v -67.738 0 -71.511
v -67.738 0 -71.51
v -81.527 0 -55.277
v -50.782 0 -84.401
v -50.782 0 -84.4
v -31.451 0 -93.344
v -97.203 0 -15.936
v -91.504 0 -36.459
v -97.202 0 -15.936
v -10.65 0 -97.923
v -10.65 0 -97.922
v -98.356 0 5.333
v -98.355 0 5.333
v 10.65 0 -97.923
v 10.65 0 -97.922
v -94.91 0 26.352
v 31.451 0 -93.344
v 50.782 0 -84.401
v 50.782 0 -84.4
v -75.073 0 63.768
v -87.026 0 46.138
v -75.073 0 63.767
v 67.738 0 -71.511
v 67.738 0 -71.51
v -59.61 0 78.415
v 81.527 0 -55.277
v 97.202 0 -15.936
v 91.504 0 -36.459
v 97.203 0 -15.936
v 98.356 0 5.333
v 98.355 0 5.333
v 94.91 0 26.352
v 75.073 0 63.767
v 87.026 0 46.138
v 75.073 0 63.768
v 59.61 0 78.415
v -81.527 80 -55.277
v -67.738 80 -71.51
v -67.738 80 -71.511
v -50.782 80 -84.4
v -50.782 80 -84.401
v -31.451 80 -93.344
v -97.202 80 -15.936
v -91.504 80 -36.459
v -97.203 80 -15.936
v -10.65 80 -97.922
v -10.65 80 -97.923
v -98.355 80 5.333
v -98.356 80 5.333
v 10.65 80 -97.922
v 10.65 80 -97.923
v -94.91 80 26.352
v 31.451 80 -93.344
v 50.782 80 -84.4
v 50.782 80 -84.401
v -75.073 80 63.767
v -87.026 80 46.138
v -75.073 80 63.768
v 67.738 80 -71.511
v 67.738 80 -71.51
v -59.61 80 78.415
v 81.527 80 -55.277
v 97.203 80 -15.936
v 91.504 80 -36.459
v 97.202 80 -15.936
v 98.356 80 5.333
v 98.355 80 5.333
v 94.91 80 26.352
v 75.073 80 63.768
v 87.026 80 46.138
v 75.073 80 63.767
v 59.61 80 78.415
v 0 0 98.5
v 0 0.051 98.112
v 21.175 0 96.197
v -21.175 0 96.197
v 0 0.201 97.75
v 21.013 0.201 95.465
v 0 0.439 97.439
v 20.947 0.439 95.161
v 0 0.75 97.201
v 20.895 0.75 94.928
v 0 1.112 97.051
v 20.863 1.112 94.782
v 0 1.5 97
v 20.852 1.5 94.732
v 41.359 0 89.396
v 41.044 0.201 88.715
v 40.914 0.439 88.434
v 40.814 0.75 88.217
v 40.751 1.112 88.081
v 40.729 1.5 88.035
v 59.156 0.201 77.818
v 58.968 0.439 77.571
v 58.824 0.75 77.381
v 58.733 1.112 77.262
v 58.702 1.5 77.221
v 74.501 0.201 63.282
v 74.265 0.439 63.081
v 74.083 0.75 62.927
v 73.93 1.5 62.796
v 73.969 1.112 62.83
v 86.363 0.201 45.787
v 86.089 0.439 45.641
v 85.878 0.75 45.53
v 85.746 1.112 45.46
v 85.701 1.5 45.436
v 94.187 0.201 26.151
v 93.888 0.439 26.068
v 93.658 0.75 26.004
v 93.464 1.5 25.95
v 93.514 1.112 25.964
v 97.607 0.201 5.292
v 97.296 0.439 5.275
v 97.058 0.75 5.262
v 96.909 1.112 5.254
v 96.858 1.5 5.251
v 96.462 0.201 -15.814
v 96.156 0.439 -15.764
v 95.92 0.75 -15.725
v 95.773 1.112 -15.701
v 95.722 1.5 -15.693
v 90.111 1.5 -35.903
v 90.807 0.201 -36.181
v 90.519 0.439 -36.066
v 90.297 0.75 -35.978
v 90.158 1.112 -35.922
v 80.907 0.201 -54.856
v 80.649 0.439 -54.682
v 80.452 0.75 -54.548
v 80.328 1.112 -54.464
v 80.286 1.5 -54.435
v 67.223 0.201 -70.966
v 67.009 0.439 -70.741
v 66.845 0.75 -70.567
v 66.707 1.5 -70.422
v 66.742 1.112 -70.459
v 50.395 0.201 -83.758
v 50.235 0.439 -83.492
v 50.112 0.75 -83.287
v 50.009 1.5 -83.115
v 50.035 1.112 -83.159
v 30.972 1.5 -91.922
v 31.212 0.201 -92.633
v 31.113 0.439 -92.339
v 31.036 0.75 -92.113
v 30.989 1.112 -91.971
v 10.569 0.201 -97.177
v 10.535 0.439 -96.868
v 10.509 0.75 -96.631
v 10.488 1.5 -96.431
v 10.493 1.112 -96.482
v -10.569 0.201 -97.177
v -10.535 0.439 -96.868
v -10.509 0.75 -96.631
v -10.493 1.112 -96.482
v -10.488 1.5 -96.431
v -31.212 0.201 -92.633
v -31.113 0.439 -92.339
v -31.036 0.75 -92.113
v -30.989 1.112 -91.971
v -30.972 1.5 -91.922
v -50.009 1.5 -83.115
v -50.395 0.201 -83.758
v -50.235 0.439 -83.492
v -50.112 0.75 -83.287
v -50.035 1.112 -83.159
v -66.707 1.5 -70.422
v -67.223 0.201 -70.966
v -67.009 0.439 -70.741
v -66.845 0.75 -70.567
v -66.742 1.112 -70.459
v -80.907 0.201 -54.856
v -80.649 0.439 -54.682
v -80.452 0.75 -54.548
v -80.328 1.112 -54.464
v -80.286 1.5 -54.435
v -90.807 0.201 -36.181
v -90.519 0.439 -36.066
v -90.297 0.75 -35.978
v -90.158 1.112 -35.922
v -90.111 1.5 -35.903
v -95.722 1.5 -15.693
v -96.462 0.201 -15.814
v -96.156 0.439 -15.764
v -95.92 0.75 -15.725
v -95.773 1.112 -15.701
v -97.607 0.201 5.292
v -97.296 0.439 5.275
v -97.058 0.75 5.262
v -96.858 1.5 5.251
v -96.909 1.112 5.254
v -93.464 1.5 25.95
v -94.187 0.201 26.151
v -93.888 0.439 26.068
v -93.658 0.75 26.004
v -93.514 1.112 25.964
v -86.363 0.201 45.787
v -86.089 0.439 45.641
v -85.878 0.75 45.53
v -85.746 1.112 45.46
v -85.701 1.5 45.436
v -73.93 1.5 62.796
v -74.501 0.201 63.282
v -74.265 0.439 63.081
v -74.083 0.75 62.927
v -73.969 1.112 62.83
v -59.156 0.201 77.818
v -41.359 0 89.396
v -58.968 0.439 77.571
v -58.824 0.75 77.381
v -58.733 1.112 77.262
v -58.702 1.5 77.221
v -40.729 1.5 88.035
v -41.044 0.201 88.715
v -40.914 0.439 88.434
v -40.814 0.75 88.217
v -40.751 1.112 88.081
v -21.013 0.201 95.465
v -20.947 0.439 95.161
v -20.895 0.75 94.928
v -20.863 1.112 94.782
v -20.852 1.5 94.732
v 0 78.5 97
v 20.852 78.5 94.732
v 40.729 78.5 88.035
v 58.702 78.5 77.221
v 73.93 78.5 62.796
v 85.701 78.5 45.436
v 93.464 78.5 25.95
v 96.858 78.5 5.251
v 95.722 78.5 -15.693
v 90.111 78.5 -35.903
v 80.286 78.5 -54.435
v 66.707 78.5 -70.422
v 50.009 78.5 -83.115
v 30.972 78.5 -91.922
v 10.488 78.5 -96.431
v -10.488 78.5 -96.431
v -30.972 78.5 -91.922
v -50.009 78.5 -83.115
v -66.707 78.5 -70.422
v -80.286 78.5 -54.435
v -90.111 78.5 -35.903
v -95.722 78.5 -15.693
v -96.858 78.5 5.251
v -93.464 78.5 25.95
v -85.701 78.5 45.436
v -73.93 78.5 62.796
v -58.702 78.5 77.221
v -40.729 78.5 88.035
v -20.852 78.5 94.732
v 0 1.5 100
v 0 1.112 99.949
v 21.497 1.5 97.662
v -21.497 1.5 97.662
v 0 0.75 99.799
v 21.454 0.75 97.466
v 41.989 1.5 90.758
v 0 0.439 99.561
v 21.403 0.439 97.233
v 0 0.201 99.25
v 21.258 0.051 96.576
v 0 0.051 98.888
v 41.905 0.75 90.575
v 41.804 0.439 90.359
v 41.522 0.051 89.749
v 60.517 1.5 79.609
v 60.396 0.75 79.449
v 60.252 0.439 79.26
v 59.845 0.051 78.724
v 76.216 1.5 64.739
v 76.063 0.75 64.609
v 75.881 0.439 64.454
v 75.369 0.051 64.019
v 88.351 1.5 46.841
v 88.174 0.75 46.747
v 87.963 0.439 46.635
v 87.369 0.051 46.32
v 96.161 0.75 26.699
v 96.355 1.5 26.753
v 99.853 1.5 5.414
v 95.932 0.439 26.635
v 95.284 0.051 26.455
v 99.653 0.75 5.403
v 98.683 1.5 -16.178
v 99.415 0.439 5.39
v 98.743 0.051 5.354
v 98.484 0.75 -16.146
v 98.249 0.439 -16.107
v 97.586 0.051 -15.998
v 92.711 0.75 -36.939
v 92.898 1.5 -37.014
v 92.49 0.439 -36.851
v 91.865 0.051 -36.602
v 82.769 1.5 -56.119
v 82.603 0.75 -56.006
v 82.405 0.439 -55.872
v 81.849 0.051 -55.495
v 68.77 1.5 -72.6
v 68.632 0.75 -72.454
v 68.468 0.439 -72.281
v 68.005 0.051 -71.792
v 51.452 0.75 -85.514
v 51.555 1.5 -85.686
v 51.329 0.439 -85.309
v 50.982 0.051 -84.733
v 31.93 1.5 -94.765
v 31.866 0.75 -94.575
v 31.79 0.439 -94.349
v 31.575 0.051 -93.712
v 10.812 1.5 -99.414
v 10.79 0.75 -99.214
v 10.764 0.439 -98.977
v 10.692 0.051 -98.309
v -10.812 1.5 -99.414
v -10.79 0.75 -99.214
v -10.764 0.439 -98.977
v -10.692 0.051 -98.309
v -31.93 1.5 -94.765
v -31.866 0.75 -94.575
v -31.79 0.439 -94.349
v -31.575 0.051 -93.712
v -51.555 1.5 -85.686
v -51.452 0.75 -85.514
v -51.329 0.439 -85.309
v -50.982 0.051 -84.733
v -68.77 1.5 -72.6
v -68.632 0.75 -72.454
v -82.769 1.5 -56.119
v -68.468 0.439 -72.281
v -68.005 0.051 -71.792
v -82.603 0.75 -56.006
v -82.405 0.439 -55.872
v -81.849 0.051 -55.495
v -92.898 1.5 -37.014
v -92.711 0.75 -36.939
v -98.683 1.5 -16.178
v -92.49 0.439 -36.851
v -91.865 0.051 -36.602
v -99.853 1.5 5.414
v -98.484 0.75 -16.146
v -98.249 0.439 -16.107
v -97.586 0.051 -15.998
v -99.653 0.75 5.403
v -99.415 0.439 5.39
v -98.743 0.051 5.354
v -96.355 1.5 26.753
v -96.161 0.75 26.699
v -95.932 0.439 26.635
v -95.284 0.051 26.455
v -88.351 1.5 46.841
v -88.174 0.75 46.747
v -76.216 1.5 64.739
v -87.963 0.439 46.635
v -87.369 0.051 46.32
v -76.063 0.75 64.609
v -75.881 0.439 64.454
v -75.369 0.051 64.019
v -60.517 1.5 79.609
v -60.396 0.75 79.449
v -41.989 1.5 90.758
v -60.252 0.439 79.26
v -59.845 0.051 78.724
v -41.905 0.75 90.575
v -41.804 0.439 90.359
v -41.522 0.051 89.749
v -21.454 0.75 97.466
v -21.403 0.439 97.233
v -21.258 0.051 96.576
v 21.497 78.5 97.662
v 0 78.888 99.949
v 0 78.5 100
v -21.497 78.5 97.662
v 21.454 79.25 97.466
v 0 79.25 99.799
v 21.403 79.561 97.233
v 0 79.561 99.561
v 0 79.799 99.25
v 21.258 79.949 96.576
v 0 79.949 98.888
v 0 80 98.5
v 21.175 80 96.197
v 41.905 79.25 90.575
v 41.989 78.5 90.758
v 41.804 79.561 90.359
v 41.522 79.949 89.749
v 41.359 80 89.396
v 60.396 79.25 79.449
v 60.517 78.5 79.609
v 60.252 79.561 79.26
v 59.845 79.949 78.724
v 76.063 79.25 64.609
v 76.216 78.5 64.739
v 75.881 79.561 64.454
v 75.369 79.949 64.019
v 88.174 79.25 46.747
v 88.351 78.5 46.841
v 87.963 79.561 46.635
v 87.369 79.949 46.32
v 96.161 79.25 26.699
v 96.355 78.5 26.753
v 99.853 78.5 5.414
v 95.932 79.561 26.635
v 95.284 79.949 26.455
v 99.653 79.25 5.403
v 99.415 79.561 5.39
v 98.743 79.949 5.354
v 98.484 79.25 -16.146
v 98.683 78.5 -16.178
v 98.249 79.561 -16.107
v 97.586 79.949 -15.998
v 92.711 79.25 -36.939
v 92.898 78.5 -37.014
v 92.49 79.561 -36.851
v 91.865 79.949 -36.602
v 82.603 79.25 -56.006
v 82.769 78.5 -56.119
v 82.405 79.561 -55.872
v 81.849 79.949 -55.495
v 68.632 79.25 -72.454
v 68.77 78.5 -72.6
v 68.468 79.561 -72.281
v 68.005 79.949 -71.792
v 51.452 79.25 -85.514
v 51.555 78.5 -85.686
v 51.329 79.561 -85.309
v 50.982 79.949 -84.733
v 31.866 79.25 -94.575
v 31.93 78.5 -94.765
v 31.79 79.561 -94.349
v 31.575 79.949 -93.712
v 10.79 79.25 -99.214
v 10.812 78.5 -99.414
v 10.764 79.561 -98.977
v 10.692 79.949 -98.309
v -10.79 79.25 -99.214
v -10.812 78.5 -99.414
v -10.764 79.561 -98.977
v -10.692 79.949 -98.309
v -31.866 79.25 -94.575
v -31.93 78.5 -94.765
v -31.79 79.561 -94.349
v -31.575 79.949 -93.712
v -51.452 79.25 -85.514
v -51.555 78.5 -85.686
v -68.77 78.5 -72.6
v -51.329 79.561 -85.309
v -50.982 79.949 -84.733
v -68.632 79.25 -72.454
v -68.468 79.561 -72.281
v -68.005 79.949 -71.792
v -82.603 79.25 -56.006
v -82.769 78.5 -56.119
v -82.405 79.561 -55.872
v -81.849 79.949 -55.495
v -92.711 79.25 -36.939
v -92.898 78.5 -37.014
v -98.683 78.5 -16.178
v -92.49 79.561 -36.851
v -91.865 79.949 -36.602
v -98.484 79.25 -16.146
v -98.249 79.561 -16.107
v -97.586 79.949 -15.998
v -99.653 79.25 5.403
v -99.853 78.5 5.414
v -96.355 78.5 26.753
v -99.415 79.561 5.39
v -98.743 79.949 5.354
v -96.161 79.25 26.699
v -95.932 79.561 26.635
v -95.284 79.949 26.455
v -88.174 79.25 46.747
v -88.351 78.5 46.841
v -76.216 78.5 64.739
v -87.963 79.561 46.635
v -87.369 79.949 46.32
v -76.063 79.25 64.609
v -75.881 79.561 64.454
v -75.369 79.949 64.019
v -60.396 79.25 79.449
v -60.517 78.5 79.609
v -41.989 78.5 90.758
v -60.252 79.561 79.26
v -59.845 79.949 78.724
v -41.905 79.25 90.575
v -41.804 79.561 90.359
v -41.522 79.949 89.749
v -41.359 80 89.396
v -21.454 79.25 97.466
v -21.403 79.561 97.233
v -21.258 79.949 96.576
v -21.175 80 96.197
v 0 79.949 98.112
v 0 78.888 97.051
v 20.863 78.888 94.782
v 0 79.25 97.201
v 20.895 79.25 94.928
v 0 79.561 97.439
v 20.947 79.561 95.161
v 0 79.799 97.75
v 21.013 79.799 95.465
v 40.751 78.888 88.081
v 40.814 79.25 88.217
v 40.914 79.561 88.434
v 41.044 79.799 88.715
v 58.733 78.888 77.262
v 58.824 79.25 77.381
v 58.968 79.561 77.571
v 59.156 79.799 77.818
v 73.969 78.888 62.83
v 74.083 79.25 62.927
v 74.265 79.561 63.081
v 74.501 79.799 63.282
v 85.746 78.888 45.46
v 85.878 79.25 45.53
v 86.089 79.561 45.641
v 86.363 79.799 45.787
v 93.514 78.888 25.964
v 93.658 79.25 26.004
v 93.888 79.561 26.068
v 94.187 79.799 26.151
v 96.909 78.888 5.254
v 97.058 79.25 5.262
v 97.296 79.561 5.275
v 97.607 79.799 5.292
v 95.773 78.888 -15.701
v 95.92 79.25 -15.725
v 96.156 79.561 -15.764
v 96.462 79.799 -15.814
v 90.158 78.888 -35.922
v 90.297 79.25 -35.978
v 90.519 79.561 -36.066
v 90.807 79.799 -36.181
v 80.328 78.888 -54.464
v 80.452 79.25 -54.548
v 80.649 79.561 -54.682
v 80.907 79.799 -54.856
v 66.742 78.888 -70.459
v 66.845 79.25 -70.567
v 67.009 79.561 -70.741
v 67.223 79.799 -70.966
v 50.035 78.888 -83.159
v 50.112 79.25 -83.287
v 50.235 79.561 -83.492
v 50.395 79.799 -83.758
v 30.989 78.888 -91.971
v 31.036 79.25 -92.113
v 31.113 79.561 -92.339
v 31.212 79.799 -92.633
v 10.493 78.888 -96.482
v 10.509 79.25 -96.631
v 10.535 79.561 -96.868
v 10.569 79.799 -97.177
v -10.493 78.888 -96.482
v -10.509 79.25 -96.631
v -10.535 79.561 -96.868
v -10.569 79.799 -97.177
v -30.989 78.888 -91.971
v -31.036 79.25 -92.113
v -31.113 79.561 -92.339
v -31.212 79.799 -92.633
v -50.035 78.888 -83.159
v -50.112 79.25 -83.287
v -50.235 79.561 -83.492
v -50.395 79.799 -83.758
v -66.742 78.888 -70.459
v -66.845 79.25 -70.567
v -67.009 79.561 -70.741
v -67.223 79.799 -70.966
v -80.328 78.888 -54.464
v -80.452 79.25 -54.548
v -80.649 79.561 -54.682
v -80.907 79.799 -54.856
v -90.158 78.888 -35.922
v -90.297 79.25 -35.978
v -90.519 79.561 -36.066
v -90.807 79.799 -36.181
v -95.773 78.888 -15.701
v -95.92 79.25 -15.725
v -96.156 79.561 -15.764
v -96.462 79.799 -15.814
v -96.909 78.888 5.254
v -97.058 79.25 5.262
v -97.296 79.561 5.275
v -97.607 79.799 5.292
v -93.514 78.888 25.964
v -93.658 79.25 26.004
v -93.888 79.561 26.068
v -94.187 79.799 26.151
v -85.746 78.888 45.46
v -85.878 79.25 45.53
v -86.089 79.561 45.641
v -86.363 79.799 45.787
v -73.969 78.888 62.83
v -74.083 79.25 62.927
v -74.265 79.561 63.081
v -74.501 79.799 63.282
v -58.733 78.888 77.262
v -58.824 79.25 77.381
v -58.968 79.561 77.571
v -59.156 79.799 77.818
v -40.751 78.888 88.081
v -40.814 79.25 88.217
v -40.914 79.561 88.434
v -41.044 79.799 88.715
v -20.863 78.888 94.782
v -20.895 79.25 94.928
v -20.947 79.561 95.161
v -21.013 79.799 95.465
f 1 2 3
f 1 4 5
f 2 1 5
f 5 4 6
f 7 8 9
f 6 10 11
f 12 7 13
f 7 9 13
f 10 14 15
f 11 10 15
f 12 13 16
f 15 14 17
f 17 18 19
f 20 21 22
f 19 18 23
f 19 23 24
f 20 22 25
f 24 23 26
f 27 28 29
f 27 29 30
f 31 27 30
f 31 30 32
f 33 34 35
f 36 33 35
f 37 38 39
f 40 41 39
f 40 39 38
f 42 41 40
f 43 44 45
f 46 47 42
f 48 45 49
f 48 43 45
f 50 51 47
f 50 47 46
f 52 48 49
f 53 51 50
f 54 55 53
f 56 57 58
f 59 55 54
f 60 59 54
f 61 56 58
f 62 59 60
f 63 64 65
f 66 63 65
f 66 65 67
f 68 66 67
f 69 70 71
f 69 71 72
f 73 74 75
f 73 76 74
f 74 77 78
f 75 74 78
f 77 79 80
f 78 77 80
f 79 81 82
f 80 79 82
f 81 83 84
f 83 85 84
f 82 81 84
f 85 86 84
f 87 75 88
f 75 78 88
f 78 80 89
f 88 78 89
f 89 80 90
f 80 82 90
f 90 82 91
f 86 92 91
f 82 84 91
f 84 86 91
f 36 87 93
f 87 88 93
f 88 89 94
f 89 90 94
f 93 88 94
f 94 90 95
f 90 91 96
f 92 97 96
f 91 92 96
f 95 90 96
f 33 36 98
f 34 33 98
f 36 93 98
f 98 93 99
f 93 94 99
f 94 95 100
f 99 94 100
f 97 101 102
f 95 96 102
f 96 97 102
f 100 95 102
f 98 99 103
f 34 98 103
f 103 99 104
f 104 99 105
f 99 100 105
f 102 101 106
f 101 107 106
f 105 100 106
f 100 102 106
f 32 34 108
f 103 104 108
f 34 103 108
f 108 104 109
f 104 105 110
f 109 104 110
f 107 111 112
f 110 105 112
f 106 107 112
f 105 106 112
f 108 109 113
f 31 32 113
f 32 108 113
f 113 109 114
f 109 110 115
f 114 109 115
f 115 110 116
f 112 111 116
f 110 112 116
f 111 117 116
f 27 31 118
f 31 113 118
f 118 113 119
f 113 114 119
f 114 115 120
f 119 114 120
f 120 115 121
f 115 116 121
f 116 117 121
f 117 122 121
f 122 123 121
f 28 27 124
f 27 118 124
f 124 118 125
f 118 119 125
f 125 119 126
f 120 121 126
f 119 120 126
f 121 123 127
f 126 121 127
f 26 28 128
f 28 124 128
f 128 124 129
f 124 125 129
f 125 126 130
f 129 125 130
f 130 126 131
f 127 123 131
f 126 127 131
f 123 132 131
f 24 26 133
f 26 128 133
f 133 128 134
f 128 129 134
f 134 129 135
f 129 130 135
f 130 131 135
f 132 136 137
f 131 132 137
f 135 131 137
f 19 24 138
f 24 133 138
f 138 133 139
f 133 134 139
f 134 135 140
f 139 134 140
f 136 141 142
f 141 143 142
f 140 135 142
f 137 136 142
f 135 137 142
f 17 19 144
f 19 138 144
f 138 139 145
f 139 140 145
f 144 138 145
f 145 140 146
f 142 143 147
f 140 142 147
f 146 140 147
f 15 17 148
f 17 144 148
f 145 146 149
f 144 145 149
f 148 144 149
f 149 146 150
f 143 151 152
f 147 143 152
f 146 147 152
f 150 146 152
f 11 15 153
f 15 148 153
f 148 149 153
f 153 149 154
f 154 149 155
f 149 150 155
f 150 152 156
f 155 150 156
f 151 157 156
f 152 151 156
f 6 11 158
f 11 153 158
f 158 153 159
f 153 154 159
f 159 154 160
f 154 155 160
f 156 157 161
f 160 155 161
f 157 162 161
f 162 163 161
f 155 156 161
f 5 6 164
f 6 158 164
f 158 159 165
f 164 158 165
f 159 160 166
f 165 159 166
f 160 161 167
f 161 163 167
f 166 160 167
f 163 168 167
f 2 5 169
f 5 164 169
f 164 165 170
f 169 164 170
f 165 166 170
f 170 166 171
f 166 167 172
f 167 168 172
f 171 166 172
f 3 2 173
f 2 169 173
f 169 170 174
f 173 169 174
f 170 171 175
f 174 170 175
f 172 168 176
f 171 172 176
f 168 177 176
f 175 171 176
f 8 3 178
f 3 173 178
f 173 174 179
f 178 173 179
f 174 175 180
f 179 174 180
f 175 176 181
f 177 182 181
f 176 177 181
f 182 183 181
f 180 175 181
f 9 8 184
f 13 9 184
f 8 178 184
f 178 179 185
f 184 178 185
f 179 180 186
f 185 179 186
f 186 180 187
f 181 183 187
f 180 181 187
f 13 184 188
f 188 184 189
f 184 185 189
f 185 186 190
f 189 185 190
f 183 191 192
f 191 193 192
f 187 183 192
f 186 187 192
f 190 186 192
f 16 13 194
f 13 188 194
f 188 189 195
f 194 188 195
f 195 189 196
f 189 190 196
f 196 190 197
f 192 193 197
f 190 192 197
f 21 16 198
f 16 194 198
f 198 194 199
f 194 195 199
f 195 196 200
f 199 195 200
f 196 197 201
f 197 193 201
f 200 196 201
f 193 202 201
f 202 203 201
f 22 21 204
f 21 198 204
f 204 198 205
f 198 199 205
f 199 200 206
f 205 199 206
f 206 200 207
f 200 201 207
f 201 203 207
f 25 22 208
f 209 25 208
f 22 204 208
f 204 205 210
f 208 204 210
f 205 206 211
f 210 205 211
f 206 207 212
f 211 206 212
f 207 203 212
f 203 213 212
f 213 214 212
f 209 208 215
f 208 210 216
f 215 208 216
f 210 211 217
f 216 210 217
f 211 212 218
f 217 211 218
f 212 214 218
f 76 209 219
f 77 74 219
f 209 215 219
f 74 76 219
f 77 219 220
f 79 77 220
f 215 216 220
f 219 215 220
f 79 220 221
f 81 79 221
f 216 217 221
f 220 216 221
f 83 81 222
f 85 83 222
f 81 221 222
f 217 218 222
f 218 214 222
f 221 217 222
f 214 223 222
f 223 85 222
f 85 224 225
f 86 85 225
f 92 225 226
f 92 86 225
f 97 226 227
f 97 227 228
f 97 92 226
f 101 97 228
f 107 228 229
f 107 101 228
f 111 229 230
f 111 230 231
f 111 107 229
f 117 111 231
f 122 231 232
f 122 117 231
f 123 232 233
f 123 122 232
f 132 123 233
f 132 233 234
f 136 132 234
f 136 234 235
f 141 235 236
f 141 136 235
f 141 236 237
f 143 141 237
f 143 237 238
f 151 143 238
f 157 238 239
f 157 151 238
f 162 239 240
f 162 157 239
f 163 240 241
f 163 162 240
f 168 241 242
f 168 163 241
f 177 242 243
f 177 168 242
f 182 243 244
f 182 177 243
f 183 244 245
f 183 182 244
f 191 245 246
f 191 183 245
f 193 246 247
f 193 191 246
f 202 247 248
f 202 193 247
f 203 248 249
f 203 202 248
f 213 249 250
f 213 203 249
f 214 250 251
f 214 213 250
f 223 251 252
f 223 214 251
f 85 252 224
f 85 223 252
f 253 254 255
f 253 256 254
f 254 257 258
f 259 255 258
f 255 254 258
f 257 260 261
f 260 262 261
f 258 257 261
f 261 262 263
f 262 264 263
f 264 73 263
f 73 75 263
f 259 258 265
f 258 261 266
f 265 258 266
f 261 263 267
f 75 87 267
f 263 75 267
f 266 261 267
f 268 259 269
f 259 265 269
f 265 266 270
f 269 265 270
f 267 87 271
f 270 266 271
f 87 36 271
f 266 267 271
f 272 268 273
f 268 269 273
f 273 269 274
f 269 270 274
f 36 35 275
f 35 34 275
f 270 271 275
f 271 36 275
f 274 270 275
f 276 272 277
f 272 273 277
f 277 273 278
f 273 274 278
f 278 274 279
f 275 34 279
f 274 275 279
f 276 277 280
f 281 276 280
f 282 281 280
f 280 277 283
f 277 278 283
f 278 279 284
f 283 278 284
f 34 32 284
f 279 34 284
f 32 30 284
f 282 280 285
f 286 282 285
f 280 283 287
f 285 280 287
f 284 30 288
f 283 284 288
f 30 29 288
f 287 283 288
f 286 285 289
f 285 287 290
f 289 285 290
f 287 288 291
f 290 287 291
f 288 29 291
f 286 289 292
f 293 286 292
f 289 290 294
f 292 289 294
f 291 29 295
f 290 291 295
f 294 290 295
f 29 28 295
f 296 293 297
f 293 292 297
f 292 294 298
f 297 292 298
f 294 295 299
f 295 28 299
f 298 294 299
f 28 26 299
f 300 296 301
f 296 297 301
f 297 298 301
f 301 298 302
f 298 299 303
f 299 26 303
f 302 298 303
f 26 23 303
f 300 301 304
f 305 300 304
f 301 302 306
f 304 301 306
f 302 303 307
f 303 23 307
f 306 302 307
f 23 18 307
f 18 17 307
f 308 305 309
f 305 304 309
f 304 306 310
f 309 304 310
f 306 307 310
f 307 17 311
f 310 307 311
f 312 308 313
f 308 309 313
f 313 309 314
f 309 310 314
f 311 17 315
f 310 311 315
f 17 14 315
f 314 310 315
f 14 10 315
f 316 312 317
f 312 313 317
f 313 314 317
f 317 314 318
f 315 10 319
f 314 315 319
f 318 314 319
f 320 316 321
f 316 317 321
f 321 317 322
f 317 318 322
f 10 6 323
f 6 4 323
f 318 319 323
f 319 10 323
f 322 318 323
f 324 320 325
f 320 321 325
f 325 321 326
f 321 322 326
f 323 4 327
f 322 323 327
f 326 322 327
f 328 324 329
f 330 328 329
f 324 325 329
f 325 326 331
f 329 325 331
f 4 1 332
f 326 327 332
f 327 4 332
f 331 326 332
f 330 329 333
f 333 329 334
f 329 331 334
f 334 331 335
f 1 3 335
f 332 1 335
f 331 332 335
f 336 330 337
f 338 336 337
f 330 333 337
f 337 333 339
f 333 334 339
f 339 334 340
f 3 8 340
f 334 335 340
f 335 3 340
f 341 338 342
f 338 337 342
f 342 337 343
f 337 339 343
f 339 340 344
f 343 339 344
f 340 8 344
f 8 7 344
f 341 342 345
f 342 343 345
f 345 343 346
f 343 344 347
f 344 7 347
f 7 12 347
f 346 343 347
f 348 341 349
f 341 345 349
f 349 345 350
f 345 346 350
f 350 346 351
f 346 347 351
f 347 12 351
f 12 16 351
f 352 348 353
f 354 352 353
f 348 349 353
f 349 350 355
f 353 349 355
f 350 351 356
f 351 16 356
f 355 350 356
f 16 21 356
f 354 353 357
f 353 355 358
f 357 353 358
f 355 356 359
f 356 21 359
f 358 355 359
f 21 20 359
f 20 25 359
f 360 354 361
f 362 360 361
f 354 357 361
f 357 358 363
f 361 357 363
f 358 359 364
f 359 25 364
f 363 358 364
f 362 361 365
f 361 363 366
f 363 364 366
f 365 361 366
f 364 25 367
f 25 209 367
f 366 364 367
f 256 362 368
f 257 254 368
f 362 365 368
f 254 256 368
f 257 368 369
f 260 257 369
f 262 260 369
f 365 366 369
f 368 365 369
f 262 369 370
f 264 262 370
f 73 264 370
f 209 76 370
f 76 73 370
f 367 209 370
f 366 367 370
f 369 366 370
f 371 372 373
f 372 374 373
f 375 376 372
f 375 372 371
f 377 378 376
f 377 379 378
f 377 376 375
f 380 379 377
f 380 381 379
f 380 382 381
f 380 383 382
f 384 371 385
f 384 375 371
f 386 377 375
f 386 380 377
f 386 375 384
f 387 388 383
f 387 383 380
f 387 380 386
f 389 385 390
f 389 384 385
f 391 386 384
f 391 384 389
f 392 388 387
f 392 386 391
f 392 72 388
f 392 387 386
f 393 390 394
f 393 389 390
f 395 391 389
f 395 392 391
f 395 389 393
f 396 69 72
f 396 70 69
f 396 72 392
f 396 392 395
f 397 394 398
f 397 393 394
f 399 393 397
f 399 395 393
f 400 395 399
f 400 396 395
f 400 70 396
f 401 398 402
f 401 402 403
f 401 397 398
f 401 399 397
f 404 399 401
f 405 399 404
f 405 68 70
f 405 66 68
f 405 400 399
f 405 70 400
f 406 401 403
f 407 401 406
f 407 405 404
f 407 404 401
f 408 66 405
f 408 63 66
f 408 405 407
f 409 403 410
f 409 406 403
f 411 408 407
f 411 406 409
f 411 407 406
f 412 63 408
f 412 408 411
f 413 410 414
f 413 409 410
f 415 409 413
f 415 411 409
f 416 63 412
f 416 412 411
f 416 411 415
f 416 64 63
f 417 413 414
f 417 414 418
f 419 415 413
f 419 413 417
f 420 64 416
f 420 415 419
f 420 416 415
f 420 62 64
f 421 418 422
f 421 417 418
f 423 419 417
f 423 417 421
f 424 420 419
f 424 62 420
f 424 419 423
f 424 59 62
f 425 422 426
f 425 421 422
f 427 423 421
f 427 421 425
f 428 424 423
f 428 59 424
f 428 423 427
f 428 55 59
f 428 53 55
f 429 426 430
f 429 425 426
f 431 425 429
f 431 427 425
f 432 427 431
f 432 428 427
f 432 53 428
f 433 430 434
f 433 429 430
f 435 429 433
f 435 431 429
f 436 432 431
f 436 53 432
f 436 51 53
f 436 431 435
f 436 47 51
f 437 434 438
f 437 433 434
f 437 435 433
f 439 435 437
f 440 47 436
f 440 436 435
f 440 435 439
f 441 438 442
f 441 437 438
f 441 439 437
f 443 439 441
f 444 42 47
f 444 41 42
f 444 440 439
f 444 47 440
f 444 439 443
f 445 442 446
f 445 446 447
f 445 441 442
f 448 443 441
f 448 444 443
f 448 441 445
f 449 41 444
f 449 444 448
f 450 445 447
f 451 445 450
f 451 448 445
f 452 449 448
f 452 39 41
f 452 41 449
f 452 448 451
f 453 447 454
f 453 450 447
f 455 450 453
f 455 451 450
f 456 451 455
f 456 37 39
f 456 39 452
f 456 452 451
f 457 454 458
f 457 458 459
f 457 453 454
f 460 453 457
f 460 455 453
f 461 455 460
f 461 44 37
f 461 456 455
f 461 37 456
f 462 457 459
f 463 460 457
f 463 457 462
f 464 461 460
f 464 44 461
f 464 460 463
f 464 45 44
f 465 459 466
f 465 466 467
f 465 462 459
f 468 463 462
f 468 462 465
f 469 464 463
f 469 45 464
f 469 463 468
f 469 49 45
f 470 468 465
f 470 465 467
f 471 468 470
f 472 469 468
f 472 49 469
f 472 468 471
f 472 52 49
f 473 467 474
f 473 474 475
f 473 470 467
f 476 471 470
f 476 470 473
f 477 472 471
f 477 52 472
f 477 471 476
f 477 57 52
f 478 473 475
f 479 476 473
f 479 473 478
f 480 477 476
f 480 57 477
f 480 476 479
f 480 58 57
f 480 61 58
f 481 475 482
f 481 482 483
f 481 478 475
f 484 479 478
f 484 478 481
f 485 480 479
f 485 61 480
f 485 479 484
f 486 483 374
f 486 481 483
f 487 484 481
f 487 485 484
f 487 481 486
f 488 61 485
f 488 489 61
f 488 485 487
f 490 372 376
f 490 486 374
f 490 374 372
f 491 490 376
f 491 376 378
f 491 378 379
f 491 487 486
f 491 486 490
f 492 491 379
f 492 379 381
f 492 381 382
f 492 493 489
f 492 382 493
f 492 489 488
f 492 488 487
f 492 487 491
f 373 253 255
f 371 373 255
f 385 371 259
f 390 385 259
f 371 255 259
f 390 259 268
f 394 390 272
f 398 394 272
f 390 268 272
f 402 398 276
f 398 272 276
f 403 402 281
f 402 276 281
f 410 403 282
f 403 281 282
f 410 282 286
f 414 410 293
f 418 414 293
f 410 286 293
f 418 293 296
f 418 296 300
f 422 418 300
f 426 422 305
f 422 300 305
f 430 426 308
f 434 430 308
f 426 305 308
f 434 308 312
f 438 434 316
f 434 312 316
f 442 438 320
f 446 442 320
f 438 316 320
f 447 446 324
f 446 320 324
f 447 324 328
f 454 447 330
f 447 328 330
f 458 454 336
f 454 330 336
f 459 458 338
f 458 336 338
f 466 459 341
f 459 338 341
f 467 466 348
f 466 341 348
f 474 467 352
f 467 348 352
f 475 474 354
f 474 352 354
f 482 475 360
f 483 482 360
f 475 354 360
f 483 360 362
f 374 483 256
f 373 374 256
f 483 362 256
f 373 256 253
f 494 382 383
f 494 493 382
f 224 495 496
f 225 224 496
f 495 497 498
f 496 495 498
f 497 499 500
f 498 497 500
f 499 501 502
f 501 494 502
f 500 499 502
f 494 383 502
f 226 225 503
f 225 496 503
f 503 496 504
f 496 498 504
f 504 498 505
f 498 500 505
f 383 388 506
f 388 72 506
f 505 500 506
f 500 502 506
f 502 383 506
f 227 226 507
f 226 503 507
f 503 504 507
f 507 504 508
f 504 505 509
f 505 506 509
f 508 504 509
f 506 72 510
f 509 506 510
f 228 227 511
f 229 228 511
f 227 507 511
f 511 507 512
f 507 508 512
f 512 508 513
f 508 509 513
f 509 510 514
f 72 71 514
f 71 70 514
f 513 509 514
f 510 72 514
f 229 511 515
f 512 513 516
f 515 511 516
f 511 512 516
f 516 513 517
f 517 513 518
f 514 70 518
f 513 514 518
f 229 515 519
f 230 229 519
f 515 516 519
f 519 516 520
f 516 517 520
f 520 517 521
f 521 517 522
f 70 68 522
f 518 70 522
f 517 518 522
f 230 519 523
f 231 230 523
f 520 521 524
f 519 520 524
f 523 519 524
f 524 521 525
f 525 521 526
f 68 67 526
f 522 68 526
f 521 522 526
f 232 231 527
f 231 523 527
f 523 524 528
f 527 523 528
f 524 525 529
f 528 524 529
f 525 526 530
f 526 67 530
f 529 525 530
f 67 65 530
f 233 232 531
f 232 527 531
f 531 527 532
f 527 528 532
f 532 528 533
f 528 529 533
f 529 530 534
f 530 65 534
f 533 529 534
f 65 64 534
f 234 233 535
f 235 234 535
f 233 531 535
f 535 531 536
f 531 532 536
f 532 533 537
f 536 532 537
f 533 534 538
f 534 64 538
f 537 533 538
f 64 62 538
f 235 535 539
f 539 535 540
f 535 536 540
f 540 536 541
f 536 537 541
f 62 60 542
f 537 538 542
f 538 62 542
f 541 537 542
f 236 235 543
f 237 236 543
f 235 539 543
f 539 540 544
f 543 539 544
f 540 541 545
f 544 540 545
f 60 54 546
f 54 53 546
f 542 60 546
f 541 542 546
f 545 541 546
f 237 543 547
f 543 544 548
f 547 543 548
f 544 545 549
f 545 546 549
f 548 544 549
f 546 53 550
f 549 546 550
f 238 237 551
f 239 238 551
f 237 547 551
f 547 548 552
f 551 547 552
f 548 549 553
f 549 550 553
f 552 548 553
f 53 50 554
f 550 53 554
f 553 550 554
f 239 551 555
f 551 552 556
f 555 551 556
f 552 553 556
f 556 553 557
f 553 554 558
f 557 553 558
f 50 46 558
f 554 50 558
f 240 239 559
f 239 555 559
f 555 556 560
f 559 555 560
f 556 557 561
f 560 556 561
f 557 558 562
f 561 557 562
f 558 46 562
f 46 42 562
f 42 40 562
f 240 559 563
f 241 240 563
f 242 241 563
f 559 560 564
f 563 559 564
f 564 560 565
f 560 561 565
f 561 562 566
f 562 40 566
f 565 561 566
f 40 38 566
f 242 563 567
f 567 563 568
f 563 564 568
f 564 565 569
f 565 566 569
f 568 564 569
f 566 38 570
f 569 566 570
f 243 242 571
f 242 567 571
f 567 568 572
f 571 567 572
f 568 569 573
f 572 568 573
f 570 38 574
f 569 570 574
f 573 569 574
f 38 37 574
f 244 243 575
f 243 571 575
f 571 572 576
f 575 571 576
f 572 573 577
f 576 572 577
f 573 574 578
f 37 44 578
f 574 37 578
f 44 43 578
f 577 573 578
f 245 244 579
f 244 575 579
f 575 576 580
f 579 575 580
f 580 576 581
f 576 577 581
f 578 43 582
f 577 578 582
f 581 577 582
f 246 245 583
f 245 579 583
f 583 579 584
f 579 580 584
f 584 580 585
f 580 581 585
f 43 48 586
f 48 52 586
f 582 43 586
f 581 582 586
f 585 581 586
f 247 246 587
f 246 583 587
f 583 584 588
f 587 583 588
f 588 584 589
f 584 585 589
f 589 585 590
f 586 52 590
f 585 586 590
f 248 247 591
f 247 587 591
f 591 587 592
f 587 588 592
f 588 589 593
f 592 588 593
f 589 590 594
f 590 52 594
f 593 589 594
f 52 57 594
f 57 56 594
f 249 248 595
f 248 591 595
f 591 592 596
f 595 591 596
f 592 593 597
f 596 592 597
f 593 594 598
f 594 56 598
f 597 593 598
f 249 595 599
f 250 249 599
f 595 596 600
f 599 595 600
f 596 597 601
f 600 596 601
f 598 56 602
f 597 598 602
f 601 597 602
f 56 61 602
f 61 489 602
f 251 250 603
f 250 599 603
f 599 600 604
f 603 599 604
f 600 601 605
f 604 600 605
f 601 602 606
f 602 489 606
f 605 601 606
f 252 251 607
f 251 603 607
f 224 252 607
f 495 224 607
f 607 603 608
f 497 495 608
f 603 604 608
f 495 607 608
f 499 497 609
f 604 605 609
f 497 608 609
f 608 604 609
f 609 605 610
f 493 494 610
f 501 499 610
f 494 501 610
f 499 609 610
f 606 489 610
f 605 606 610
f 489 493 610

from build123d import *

# Parameters (mm, degrees)
SHIELD_CROSS_SECTION_SKETCH_R   = 100
SHIELD_CROSS_SECTION_SKETCH_R_2 = 97
SHIELD_EXTRUDE_DEPTH            = 80
TOP_FILLET_R                    = 1.5
BOTTOM_FILLET_R                 = 1.5


with BuildPart() as part:
    # Shield Cross Section Sketch → Shield Extrude (new body)
    with BuildSketch(Plane(origin=(0, 0, 0), x_dir=(1, 0, 0), z_dir=(0, 1, 0))):
        with Locations(Location((0, 0, 0), (0, 0, 270))):
            Circle(SHIELD_CROSS_SECTION_SKETCH_R)
        with Locations(Location((0, 0, 0), (0, 0, 270))):
            Circle(SHIELD_CROSS_SECTION_SKETCH_R_2, mode=Mode.SUBTRACT)
    extrude(amount=SHIELD_EXTRUDE_DEPTH)

    # Top Fillet
    top_fillet_edges = [part.edges().sort_by_distance(p)[0] for p in [
        (0, 80, -100),
        (0, 80, -97),
    ]]
    fillet(top_fillet_edges, radius=TOP_FILLET_R - 0.0001)  # a hair under: the kernel refuses the full size

    # Bottom Fillet
    bottom_fillet_edges = [part.edges().sort_by_distance(p)[0] for p in [
        (0, 0, -100),
        (0, 0, -97),
    ]]
    fillet(bottom_fillet_edges, radius=BOTTOM_FILLET_R - 0.0001)  # a hair under: the kernel refuses the full size


solid = part.part
